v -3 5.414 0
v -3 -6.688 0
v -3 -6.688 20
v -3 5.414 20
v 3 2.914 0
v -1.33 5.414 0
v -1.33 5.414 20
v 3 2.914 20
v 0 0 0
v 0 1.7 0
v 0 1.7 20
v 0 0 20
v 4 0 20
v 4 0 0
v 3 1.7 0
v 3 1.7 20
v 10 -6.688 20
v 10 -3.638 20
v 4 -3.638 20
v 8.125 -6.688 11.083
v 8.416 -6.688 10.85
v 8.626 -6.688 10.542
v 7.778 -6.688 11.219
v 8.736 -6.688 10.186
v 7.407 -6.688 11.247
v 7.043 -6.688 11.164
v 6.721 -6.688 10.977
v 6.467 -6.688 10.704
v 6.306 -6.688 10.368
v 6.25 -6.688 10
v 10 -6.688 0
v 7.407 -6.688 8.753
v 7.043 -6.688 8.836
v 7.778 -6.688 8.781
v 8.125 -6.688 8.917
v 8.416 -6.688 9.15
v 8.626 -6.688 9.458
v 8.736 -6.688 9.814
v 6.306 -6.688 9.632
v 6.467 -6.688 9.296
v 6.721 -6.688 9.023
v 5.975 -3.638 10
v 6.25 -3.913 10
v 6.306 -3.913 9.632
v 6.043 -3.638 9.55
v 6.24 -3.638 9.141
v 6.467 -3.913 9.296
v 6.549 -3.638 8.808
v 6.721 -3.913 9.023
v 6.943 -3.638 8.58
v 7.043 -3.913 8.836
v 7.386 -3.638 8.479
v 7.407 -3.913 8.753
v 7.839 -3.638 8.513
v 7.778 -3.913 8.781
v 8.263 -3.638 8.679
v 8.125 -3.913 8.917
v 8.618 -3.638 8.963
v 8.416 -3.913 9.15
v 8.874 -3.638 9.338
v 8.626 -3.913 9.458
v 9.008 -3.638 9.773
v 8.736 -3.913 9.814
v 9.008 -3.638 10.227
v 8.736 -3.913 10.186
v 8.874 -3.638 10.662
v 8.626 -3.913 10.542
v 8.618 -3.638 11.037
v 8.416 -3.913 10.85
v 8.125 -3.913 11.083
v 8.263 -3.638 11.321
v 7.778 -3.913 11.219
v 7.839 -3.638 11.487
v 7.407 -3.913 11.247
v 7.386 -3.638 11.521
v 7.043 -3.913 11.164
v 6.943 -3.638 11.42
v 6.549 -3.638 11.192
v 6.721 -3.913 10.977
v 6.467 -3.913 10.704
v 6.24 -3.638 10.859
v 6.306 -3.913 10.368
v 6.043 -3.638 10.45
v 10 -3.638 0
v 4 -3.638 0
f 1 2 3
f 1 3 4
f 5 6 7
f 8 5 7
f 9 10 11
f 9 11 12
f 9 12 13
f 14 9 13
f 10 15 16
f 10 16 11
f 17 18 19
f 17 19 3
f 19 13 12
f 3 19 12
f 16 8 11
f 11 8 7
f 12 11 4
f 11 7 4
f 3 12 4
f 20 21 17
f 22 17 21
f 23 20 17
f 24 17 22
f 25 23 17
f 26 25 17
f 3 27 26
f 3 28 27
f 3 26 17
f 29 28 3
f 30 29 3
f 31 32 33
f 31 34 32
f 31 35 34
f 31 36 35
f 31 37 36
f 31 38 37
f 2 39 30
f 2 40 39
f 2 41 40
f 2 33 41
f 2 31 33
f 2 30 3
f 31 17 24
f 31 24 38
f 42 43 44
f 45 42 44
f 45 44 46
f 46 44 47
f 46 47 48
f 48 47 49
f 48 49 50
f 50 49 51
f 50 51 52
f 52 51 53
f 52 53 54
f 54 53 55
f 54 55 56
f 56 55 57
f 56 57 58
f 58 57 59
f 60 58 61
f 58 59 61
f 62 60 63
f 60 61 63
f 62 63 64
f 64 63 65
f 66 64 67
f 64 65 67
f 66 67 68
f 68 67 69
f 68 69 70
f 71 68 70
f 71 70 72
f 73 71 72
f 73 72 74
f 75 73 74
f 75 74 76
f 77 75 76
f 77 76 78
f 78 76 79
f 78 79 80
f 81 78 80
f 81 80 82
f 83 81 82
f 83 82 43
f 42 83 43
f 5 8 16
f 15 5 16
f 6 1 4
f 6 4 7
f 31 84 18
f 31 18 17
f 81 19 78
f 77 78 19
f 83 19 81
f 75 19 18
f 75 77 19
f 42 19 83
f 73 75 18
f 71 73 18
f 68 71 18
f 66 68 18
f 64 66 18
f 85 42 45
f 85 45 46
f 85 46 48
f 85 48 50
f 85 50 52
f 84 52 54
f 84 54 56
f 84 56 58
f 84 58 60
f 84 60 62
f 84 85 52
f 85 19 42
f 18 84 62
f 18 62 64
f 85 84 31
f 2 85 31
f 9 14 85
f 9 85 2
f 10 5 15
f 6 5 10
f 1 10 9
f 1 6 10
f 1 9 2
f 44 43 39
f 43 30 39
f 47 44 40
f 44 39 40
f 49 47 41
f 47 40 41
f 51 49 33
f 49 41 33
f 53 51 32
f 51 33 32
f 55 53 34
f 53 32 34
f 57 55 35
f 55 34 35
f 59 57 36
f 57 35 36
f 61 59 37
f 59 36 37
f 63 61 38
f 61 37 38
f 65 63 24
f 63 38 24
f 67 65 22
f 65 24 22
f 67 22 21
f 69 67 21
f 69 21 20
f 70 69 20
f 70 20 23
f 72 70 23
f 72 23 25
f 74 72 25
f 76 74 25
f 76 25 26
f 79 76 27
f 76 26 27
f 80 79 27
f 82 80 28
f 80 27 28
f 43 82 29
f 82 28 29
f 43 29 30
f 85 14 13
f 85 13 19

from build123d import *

# Parameters (mm, degrees)
BOSS_EXTRUDE1_DEPTH             = 20
M3X0_5_TAPPED_HOLE1_D           = 2.5
M3X0_5_TAPPED_HOLE1_CSINK_D     = 3.05
M3X0_5_TAPPED_HOLE1_CSINK_ANGLE = 90
CHAMFER1_SIZE                   = 2.5
CHAMFER1_SIZE2                  = 4.330127019


with BuildPart() as part:
    # Sketch1 → Boss-Extrude1 (new body)
    with BuildSketch(Plane.XY):
        Polygon((0, 0), (4, 0), (4, -3.637956731), (10, -3.637956731), (10, -6.68821772), (-3, -6.68821772), (-3, 5.414430721), (3, 5.414430721), (3, 1.7), (0, 1.7), align=None)
    extrude(amount=BOSS_EXTRUDE1_DEPTH)

    # M3x0.5 Tapped Hole1 (through all)
    with Locations(Plane(origin=(0, -3.637956731, 0), x_dir=(1, 0, 0), z_dir=(0, 1, 0))):
        with Locations((7.5, -10)):
            CounterSinkHole(M3X0_5_TAPPED_HOLE1_D / 2, M3X0_5_TAPPED_HOLE1_CSINK_D / 2, counter_sink_angle=M3X0_5_TAPPED_HOLE1_CSINK_ANGLE)

    # Chamfer1
    chamfer1_edges = [part.edges().sort_by_distance(p)[0] for p in [
        (3, 5.414430721, 10),
    ]]
    chamfer1_side = [part.faces().sort_by_distance(p)[0] for p in [
        (3, 3.55721536, 10),
    ]]
    chamfer(chamfer1_edges, length=CHAMFER1_SIZE, length2=CHAMFER1_SIZE2, reference=chamfer1_side[0])


solid = part.part
